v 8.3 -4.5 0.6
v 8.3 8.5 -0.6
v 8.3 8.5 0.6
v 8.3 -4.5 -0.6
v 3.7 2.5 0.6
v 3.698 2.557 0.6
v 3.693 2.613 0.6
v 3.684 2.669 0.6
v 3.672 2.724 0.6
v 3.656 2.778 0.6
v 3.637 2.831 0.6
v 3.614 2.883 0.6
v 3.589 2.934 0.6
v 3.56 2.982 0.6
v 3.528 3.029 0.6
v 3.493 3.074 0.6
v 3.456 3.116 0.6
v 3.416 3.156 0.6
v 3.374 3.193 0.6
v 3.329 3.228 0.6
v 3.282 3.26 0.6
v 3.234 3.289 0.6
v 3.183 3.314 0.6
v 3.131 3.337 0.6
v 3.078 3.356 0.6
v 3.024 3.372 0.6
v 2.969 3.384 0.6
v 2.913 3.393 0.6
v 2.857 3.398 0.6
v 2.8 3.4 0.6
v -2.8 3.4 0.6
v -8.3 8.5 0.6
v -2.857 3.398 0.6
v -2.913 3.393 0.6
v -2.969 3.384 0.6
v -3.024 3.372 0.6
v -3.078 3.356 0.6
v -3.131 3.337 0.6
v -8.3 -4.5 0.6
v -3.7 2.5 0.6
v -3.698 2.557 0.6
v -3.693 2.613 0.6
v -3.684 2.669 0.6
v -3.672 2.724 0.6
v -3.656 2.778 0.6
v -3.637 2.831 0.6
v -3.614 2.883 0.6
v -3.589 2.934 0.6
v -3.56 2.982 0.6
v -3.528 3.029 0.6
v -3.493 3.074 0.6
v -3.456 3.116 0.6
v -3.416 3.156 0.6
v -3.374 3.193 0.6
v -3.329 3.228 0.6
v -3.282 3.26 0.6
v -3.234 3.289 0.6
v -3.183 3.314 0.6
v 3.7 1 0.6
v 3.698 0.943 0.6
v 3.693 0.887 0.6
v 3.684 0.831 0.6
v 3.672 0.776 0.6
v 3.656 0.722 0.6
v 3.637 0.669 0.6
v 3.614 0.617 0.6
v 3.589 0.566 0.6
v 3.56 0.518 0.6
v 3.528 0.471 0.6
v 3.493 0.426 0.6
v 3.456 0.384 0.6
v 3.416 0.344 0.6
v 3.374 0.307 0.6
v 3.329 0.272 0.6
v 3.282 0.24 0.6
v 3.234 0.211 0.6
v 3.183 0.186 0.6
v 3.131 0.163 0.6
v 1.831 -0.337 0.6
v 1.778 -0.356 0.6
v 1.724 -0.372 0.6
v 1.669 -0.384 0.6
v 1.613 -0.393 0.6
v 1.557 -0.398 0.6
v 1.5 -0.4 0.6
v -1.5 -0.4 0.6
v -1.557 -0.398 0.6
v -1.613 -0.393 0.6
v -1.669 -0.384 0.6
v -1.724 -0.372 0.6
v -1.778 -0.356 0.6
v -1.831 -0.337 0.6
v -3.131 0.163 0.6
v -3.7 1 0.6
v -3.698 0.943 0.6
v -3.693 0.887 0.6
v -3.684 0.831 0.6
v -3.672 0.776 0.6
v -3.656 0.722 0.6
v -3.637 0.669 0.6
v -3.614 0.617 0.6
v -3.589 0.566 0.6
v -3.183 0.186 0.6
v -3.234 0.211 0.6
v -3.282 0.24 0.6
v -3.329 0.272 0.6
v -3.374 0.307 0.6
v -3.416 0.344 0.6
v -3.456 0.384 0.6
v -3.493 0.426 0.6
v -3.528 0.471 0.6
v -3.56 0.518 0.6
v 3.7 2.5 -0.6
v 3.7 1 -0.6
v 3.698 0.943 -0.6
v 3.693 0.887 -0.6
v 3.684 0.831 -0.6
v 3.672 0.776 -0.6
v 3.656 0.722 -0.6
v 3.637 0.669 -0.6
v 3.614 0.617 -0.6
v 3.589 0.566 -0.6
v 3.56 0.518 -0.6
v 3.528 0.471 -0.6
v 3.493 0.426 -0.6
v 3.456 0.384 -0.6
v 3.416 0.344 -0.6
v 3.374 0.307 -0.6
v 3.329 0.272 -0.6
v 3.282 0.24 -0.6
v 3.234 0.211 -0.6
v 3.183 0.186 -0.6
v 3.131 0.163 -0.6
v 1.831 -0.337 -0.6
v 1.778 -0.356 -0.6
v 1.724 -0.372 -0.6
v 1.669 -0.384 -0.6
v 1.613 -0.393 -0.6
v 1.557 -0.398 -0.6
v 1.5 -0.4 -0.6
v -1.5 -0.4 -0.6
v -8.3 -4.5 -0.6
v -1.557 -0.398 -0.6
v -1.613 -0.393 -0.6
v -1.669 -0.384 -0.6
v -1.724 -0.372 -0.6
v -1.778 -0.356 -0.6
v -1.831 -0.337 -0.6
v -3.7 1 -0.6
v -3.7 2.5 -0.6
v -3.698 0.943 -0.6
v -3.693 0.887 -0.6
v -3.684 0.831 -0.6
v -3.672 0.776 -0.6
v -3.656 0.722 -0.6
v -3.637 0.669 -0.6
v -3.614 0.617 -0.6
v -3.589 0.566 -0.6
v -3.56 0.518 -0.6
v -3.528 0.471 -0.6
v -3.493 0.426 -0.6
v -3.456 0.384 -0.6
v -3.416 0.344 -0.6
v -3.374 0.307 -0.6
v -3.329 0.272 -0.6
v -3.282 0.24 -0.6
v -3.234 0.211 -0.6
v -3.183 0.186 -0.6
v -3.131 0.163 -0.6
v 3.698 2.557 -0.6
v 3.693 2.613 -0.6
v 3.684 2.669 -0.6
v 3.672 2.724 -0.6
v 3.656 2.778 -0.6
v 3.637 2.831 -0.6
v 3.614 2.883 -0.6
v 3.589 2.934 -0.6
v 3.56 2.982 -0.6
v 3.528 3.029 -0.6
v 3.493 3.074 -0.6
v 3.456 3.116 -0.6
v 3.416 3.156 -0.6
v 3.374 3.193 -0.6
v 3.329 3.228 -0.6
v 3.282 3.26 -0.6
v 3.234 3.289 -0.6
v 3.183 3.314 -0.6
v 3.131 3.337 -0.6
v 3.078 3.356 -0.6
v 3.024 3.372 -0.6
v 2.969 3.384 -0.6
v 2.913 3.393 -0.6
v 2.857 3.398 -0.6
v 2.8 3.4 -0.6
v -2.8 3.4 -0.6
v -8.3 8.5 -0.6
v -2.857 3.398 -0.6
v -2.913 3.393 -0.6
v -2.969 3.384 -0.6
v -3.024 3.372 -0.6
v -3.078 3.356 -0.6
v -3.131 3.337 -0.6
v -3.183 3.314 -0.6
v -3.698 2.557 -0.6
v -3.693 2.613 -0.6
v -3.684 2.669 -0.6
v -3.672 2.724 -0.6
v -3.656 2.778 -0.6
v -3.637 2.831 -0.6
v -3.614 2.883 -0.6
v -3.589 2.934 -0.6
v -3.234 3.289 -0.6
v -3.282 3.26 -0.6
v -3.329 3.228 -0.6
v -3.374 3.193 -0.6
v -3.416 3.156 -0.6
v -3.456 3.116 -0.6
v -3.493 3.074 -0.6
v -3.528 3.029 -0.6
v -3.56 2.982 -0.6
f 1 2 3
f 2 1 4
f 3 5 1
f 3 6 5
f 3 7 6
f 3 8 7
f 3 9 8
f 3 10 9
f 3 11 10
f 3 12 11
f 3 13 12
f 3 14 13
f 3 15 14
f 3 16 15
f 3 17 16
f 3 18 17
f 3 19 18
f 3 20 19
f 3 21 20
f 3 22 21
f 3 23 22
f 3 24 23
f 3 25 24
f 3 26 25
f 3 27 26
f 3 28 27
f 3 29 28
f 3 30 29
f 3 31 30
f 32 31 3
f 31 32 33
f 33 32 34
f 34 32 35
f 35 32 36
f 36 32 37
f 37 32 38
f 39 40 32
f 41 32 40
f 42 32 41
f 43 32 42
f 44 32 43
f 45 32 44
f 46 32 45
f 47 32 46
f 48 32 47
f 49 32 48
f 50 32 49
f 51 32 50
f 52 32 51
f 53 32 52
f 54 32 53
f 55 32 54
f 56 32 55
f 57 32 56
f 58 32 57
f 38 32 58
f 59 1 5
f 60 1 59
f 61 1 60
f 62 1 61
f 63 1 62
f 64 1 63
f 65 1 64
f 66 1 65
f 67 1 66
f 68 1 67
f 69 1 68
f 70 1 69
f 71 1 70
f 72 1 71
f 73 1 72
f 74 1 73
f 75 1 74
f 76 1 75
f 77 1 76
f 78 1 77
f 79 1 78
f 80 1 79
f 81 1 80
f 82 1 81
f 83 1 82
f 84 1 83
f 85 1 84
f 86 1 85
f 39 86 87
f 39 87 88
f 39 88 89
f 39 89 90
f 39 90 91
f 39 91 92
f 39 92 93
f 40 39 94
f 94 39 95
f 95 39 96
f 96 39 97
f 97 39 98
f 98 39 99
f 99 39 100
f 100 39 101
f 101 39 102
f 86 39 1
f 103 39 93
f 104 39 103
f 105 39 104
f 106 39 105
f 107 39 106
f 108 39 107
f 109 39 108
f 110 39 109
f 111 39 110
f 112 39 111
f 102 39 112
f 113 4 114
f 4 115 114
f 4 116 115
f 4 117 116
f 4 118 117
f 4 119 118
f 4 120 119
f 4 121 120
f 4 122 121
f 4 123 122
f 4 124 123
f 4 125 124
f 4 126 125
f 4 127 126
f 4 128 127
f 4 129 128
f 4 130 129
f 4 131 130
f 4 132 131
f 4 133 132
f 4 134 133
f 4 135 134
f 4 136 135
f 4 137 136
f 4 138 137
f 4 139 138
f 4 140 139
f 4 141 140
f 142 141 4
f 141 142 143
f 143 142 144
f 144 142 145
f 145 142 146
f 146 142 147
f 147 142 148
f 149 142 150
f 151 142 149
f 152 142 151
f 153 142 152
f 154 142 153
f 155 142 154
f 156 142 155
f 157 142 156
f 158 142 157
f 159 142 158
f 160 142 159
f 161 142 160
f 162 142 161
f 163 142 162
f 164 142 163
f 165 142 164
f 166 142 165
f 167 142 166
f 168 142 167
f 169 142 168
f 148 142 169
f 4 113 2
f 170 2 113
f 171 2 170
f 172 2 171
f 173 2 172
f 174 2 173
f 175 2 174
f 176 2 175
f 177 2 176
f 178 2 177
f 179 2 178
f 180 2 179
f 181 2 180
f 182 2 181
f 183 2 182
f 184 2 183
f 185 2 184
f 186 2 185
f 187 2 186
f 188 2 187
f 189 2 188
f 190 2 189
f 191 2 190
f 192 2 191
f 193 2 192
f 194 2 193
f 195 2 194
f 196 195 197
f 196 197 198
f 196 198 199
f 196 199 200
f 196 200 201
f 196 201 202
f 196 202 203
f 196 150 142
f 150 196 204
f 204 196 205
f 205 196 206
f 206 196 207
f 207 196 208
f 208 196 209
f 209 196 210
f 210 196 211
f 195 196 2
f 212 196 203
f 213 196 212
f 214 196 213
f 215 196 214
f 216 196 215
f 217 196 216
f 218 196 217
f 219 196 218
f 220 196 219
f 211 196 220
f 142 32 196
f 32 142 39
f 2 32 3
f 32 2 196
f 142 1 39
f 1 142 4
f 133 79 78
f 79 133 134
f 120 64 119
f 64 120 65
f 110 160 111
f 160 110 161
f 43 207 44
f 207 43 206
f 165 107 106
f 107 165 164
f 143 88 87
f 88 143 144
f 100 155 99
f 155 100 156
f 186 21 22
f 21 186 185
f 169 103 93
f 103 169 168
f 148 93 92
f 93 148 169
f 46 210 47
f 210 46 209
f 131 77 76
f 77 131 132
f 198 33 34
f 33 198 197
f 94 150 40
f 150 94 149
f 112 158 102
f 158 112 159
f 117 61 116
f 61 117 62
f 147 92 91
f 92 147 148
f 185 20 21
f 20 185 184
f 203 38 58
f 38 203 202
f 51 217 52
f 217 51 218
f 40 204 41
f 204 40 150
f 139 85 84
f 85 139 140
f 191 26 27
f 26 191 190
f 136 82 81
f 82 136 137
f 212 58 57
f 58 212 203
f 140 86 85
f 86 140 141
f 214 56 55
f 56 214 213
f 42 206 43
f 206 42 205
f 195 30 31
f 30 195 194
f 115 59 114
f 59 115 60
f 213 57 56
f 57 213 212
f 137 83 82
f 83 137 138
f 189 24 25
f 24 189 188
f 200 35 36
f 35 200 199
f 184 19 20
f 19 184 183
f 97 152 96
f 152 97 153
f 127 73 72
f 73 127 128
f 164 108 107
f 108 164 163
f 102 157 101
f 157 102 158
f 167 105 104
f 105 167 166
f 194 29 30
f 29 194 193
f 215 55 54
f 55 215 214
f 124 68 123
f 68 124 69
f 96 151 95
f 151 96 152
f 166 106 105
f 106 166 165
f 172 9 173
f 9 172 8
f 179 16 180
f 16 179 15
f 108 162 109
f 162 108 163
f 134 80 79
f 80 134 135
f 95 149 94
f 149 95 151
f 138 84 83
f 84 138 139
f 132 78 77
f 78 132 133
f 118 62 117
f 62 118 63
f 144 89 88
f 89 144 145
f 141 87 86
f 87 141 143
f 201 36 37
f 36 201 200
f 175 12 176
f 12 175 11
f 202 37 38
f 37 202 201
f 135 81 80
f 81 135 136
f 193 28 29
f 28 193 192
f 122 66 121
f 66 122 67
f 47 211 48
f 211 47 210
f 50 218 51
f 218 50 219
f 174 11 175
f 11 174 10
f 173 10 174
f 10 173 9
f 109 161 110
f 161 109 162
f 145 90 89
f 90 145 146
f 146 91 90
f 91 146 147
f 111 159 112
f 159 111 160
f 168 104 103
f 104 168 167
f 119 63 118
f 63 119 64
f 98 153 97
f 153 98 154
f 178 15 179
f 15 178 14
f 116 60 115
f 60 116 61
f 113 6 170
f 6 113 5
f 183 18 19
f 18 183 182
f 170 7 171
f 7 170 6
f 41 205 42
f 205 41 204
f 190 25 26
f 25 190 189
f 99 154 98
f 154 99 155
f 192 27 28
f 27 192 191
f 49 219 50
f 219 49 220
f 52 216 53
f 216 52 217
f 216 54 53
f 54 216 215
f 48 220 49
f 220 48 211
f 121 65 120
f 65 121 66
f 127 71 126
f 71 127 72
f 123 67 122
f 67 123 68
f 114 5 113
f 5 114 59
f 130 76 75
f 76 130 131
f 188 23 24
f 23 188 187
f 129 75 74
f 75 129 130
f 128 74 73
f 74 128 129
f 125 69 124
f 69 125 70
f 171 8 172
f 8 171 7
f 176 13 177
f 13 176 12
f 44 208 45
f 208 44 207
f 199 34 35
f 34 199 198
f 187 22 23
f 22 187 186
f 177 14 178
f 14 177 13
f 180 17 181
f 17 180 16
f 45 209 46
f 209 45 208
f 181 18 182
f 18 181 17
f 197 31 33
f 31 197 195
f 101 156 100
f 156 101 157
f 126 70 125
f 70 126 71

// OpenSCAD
$fn = 100;

wall = 1.2;

module HDMIMicro(hole_offset, wall)
{
    hole_offset = hole_offset + 0.1; // needs mor offset

    radius = 0.5;

    r = radius + hole_offset;

    height1 = 3.0;

    h1 = height1 - radius * 2;

    width1 = 6.6;
    w1 = width1 / 2 - radius;

    width2 = 4;
    w2 = width2 / 2 - radius;

    translate([ 0, radius, 0 ]) hull()
    {

        translate([ w1, h1, 0 ]) cylinder(h = wall, r = r, center = true);
        translate([ -w1, h1, 0 ]) cylinder(h = wall, r = r, center = true);

        translate([ w1, h1 / 4, 0 ]) cylinder(h = wall, r = r, center = true);
        translate([ -w1, h1 / 4, 0 ]) cylinder(h = wall, r = r, center = true);

        translate([ w2, 0, 0 ]) cylinder(h = wall, r = r, center = true);
        translate([ -w2, 0, 0 ]) cylinder(h = wall, r = r, center = true);
    }
}

difference()
{
    translate([ 0, 2, 0 ]) cube([ 6.6 + 10, 3.0 + 10, wall ], center = true);

    HDMIMicro(hole_offset = 0.3, wall = wall);
}
